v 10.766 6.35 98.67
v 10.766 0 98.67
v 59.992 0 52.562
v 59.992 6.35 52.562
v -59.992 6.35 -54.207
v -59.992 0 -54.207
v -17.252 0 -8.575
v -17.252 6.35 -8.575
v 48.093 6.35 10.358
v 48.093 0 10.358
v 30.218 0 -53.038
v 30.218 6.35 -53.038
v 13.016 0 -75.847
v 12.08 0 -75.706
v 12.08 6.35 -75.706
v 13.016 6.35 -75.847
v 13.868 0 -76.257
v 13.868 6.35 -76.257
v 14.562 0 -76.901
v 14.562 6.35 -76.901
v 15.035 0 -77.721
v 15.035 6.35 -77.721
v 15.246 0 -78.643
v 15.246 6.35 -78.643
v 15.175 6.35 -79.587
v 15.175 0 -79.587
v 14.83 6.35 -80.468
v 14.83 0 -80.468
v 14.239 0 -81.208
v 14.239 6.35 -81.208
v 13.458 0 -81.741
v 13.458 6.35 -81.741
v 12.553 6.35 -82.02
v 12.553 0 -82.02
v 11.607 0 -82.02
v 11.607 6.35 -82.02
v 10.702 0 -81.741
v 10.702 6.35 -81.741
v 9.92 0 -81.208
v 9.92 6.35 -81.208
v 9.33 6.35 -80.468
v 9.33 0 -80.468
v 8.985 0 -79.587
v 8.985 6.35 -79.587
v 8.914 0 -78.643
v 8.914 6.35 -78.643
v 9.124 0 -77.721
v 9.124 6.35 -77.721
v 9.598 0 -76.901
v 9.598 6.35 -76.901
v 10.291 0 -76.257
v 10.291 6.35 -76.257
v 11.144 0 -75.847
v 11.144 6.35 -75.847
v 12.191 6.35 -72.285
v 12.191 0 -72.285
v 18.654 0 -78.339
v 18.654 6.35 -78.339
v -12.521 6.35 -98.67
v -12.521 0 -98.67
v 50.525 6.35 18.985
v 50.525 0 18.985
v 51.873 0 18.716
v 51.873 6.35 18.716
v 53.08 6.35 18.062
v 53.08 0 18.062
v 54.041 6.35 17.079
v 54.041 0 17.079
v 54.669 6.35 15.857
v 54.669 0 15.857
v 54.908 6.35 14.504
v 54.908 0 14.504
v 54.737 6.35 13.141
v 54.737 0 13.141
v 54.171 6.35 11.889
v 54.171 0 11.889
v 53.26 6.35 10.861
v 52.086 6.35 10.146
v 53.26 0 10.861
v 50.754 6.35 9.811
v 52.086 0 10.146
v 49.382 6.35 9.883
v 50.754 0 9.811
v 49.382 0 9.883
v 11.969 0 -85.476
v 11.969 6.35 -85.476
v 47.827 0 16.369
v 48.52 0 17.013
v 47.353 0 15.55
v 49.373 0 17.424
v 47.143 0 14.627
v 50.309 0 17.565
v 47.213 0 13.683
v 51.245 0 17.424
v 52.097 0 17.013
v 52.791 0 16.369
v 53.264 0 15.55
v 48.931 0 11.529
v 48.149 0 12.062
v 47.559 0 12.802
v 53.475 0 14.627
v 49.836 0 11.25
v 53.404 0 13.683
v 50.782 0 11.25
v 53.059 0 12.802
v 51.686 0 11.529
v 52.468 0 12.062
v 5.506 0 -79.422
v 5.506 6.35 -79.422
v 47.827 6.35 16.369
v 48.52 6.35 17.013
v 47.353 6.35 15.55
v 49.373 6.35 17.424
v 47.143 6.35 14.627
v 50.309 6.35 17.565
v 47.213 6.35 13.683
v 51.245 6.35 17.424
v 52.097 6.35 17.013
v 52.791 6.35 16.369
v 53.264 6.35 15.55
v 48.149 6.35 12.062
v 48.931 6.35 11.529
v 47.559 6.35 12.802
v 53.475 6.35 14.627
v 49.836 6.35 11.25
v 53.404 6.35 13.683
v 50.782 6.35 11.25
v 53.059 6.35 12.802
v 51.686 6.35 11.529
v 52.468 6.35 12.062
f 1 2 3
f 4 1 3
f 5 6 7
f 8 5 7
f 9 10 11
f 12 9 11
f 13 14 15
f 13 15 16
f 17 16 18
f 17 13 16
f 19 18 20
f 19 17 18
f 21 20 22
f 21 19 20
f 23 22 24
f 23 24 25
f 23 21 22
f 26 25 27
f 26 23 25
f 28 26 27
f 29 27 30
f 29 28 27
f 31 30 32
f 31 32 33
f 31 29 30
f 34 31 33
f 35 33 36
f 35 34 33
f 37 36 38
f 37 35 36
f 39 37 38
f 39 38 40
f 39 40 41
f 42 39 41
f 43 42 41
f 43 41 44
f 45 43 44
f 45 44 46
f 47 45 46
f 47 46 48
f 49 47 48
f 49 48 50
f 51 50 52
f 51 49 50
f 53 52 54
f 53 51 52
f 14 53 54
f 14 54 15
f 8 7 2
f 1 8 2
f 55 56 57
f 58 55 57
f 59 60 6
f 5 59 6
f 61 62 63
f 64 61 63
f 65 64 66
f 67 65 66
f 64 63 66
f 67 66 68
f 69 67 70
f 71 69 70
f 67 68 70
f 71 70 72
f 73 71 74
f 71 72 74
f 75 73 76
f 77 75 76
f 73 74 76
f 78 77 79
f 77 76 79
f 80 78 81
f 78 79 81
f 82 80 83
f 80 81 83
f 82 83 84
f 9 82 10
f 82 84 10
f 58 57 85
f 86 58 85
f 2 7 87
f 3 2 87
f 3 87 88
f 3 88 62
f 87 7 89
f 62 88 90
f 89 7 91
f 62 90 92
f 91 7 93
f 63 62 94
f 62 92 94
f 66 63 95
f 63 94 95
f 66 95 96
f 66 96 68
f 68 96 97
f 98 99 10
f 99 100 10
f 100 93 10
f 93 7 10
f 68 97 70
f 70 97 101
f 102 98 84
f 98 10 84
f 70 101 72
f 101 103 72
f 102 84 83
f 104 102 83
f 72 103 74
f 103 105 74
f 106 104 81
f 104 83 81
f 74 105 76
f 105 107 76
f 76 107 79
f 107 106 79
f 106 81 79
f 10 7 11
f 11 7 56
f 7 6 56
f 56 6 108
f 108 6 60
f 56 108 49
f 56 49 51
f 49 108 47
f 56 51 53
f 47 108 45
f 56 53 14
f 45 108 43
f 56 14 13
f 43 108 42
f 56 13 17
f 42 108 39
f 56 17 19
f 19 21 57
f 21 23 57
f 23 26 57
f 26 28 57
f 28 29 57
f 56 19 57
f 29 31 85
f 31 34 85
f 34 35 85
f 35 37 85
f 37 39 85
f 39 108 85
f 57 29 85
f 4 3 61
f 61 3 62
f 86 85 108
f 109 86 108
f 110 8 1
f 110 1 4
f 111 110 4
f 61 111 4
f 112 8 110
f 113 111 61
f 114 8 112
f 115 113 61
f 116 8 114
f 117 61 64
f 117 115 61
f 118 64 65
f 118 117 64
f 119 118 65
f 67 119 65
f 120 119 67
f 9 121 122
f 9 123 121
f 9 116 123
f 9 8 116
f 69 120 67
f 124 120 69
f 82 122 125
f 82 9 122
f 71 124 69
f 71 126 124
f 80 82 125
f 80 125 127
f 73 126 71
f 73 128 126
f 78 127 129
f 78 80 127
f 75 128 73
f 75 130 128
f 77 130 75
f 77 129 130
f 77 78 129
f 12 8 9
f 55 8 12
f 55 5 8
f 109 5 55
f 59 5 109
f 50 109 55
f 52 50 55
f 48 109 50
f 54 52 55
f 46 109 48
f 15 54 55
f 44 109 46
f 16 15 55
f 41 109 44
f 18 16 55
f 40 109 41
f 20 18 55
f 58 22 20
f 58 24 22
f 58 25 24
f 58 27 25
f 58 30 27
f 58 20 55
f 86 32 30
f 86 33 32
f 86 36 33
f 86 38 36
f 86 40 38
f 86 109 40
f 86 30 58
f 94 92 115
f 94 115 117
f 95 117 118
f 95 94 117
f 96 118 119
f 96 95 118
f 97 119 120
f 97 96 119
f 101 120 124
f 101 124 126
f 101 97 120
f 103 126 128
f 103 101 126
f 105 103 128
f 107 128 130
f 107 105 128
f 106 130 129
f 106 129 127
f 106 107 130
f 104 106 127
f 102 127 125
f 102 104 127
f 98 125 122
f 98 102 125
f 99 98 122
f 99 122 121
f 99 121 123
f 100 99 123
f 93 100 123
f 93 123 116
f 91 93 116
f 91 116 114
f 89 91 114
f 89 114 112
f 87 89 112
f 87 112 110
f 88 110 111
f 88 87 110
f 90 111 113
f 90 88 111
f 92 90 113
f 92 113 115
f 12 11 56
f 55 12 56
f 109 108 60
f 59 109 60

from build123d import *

# Parameters (mm, degrees)
SKETCH1_R           = 3.175
BOSS_EXTRUDE1_DEPTH = 6.35


with BuildPart() as part:
    # Sketch1 → Boss-Extrude1 (new body)
    with BuildSketch(Plane(origin=(0, 0, 0), x_dir=(1, 0, 0), z_dir=(0, 1, 0))):
        with BuildLine():
            Line((59.992329175, -52.562440303), (50.525242276, -18.985043707))
            ThreePointArc((50.525242276, -18.985043707), (54.736759655, -13.141199939), (48.092868173, -10.358019279))
            Line((48.092868173, -10.358019279), (30.218426447, 53.0381685))
            Line((30.218426447, 53.0381685), (12.190853288, 72.285391563))
            Line((12.190853288, 72.285391563), (18.653548719, 78.338561638))
            Line((18.653548719, 78.338561638), (11.968839999, 85.475522266))
            Line((11.968839999, 85.475522266), (5.506144568, 79.422352191))
            Line((5.506144568, 79.422352191), (-12.521428591, 98.669575253))
            Line((-12.521428591, 98.669575253), (-59.992329175, 54.206790652))
            Line((-59.992329175, 54.206790652), (-17.252470825, 8.575380364))
            Line((-17.252470825, 8.575380364), (10.765830225, -98.669575253))
            Line((10.765830225, -98.669575253), (59.992329175, -52.562440303))
        make_face()
        with Locations(Location((12.079948167, 78.880545368, 0), (0, 0, 270))):
            Circle(SKETCH1_R, mode=Mode.SUBTRACT)
        with Locations(Location((50.308887465, -14.389630582, 0), (0, 0, 270))):
            Circle(SKETCH1_R, mode=Mode.SUBTRACT)
    extrude(amount=BOSS_EXTRUDE1_DEPTH)


solid = part.part
